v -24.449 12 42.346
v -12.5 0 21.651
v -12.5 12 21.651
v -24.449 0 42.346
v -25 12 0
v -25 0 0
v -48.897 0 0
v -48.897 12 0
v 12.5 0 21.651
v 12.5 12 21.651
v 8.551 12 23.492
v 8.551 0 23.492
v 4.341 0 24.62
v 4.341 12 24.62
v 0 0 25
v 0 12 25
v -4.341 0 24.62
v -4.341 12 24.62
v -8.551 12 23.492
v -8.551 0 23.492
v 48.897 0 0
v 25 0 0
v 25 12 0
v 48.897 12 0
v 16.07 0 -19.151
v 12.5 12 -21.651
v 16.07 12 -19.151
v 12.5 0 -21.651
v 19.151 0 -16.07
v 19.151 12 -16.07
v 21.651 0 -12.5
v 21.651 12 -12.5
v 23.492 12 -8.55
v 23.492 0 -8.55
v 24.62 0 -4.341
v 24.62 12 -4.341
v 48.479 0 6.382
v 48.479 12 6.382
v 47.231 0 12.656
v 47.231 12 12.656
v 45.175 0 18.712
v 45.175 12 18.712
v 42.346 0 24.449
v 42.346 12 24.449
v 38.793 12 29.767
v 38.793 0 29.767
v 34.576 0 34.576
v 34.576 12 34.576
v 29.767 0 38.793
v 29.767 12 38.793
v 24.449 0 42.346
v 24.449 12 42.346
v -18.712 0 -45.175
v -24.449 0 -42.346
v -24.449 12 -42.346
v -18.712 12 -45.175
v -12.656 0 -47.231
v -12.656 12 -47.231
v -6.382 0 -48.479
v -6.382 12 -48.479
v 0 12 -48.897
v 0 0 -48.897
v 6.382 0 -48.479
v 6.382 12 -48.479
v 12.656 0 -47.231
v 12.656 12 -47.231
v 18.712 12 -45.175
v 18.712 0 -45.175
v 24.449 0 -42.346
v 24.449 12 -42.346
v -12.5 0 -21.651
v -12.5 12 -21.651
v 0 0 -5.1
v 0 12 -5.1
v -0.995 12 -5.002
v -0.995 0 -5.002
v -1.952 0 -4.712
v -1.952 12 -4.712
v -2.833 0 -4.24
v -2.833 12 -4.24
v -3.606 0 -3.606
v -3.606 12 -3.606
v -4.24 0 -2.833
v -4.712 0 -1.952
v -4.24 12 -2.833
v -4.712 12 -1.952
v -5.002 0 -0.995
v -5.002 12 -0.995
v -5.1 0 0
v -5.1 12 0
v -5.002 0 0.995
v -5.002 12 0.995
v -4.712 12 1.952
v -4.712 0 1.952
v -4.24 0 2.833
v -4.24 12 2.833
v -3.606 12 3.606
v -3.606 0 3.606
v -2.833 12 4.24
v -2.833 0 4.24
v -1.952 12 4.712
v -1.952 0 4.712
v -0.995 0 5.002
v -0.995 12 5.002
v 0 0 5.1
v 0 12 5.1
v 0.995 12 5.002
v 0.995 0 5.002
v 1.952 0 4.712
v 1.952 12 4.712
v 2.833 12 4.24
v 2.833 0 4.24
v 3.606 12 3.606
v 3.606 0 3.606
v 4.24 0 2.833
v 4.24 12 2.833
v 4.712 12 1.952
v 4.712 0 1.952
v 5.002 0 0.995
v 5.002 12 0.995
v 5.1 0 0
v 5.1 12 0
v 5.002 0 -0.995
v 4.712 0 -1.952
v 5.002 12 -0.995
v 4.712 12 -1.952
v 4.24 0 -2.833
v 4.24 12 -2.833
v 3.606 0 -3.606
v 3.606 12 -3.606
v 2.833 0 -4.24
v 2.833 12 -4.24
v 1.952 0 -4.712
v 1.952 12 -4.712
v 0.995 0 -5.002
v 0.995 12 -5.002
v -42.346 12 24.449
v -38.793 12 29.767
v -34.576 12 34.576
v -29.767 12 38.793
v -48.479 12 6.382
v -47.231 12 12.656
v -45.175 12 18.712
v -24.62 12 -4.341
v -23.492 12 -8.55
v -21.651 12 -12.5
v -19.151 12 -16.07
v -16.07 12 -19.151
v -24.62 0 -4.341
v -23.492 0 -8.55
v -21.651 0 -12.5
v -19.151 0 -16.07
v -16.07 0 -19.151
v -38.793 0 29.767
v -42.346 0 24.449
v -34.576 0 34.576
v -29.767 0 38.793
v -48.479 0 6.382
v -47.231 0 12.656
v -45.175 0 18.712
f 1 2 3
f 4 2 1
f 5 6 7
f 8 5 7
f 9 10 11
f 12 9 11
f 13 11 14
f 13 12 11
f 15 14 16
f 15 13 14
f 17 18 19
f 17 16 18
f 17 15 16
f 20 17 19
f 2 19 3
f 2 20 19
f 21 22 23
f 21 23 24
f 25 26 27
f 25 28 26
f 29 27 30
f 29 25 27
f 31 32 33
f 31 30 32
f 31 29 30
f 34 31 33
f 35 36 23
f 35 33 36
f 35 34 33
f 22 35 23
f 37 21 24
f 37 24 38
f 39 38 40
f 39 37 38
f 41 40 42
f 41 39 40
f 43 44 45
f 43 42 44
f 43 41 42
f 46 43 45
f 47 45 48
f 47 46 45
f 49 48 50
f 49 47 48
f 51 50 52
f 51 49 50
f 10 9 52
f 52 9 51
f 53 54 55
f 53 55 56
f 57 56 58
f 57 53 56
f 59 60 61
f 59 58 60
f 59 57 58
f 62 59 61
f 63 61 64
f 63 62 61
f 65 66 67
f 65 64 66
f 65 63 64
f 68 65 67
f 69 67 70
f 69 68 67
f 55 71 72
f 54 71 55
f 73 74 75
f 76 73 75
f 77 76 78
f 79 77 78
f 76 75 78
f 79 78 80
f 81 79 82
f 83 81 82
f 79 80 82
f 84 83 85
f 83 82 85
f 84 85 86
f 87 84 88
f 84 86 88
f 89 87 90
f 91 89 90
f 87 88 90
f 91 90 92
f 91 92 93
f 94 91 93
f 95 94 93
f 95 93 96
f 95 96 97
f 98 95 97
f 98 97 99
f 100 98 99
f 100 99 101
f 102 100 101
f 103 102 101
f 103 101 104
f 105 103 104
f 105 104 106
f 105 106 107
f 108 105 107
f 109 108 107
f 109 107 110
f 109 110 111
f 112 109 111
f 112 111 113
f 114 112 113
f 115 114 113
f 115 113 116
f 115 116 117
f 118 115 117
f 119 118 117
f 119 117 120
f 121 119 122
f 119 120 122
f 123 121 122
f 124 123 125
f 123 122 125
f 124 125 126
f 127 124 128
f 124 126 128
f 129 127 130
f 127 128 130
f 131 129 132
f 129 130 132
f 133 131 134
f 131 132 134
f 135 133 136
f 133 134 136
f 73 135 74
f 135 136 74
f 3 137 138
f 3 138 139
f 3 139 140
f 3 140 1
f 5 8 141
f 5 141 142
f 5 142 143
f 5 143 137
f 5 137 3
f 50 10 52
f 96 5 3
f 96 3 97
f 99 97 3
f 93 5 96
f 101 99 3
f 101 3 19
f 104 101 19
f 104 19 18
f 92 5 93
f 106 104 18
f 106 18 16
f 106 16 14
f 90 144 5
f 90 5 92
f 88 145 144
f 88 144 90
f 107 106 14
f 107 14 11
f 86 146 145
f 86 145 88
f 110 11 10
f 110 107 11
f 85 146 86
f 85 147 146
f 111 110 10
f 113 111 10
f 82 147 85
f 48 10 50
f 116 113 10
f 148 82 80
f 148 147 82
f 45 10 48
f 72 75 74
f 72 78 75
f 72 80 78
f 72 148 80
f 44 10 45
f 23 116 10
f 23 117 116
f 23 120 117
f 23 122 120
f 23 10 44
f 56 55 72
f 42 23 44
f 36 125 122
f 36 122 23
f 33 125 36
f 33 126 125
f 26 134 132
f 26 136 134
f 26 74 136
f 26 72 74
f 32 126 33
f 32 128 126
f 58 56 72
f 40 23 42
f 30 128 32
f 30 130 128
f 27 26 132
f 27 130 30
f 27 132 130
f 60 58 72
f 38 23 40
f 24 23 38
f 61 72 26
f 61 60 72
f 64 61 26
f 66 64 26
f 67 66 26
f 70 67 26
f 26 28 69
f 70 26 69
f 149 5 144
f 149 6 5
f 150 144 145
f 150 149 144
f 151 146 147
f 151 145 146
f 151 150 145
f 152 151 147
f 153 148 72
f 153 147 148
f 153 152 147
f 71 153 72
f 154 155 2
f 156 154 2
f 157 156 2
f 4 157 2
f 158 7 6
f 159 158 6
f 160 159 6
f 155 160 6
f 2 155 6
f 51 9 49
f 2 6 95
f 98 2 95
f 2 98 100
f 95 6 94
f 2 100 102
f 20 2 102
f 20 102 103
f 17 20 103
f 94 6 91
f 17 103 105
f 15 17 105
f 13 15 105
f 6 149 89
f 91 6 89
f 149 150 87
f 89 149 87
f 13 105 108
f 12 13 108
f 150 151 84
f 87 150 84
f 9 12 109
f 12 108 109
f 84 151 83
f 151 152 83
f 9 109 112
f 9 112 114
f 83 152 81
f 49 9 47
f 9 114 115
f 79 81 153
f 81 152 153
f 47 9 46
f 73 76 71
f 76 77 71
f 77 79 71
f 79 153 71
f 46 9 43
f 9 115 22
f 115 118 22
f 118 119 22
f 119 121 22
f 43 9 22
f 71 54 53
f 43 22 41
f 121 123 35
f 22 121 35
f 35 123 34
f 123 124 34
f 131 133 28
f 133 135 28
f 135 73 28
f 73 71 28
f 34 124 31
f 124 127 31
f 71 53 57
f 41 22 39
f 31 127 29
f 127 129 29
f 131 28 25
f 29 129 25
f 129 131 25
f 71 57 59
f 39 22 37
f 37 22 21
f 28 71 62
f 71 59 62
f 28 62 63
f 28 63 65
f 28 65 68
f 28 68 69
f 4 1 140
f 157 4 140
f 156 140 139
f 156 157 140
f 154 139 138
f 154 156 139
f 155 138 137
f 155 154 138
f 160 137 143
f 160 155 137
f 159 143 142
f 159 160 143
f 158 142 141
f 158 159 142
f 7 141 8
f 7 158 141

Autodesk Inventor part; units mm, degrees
ref_plane "YZ Plane" through (0, 0, 0) normal (1, 0, 0) x (0, 1, 0)
ref_plane "XZ Plane" through (0, 0, 0) normal (0, 1, 0) x (-1, 0, 0)
ref_plane "XY Plane" through (0, 0, 0) normal (0, 0, 1) x (1, 0, 0)
sketch "Sketch1" plane through (0, 0, 0) normal (0, 1, 0) x (1, 0, 0)
  circle A0 centre (0, 0) radius 25
  arc A1 (24.4487, 42.3463) -> (-24.4487, 42.3463) centre (0, 0) ccw
  line L0 (12.5, 21.6506) -> (24.4487, 42.3463)
  line L1 (-12.5, 21.6506) -> (-24.4487, 42.3463)
  line L2 (0, 0) -> (0, 84.0286) construction
  line L3 (-12.5, -21.6506) -> (-24.4487, -42.3463)
  arc A2 (-48.8973, 0) -> (-24.4487, -42.3463) centre (0, 0) ccw
  line L4 (-25, 0) -> (-48.8973, 0)
  line L5 (25, 0) -> (48.8973, 0)
  arc A3 (24.4487, -42.3463) -> (48.8973, 0) centre (0, 0) ccw
  line L6 (12.5, -21.6506) -> (24.4487, -42.3463)
  point P0 (25, 0)
  dimension "d0" = 50
  dimension "d1" = 60
  dimension "d2" = 30
  dimension "d5" = 360
extrude "Extrusion1" add sketch "Sketch1" along normal blind 12
sketch "Sketch4" plane through (0, 0, 0) normal (0, -1, 0) x (1, 0, 0)
  circle A0 centre (0, 0) radius 7.9289 projected
  point P0 (0, 0)
hole "Hole2" at (0, 0, 0) direction (0, 1, 0) diameter 10.2 depth 12
properties part number "rotor"
